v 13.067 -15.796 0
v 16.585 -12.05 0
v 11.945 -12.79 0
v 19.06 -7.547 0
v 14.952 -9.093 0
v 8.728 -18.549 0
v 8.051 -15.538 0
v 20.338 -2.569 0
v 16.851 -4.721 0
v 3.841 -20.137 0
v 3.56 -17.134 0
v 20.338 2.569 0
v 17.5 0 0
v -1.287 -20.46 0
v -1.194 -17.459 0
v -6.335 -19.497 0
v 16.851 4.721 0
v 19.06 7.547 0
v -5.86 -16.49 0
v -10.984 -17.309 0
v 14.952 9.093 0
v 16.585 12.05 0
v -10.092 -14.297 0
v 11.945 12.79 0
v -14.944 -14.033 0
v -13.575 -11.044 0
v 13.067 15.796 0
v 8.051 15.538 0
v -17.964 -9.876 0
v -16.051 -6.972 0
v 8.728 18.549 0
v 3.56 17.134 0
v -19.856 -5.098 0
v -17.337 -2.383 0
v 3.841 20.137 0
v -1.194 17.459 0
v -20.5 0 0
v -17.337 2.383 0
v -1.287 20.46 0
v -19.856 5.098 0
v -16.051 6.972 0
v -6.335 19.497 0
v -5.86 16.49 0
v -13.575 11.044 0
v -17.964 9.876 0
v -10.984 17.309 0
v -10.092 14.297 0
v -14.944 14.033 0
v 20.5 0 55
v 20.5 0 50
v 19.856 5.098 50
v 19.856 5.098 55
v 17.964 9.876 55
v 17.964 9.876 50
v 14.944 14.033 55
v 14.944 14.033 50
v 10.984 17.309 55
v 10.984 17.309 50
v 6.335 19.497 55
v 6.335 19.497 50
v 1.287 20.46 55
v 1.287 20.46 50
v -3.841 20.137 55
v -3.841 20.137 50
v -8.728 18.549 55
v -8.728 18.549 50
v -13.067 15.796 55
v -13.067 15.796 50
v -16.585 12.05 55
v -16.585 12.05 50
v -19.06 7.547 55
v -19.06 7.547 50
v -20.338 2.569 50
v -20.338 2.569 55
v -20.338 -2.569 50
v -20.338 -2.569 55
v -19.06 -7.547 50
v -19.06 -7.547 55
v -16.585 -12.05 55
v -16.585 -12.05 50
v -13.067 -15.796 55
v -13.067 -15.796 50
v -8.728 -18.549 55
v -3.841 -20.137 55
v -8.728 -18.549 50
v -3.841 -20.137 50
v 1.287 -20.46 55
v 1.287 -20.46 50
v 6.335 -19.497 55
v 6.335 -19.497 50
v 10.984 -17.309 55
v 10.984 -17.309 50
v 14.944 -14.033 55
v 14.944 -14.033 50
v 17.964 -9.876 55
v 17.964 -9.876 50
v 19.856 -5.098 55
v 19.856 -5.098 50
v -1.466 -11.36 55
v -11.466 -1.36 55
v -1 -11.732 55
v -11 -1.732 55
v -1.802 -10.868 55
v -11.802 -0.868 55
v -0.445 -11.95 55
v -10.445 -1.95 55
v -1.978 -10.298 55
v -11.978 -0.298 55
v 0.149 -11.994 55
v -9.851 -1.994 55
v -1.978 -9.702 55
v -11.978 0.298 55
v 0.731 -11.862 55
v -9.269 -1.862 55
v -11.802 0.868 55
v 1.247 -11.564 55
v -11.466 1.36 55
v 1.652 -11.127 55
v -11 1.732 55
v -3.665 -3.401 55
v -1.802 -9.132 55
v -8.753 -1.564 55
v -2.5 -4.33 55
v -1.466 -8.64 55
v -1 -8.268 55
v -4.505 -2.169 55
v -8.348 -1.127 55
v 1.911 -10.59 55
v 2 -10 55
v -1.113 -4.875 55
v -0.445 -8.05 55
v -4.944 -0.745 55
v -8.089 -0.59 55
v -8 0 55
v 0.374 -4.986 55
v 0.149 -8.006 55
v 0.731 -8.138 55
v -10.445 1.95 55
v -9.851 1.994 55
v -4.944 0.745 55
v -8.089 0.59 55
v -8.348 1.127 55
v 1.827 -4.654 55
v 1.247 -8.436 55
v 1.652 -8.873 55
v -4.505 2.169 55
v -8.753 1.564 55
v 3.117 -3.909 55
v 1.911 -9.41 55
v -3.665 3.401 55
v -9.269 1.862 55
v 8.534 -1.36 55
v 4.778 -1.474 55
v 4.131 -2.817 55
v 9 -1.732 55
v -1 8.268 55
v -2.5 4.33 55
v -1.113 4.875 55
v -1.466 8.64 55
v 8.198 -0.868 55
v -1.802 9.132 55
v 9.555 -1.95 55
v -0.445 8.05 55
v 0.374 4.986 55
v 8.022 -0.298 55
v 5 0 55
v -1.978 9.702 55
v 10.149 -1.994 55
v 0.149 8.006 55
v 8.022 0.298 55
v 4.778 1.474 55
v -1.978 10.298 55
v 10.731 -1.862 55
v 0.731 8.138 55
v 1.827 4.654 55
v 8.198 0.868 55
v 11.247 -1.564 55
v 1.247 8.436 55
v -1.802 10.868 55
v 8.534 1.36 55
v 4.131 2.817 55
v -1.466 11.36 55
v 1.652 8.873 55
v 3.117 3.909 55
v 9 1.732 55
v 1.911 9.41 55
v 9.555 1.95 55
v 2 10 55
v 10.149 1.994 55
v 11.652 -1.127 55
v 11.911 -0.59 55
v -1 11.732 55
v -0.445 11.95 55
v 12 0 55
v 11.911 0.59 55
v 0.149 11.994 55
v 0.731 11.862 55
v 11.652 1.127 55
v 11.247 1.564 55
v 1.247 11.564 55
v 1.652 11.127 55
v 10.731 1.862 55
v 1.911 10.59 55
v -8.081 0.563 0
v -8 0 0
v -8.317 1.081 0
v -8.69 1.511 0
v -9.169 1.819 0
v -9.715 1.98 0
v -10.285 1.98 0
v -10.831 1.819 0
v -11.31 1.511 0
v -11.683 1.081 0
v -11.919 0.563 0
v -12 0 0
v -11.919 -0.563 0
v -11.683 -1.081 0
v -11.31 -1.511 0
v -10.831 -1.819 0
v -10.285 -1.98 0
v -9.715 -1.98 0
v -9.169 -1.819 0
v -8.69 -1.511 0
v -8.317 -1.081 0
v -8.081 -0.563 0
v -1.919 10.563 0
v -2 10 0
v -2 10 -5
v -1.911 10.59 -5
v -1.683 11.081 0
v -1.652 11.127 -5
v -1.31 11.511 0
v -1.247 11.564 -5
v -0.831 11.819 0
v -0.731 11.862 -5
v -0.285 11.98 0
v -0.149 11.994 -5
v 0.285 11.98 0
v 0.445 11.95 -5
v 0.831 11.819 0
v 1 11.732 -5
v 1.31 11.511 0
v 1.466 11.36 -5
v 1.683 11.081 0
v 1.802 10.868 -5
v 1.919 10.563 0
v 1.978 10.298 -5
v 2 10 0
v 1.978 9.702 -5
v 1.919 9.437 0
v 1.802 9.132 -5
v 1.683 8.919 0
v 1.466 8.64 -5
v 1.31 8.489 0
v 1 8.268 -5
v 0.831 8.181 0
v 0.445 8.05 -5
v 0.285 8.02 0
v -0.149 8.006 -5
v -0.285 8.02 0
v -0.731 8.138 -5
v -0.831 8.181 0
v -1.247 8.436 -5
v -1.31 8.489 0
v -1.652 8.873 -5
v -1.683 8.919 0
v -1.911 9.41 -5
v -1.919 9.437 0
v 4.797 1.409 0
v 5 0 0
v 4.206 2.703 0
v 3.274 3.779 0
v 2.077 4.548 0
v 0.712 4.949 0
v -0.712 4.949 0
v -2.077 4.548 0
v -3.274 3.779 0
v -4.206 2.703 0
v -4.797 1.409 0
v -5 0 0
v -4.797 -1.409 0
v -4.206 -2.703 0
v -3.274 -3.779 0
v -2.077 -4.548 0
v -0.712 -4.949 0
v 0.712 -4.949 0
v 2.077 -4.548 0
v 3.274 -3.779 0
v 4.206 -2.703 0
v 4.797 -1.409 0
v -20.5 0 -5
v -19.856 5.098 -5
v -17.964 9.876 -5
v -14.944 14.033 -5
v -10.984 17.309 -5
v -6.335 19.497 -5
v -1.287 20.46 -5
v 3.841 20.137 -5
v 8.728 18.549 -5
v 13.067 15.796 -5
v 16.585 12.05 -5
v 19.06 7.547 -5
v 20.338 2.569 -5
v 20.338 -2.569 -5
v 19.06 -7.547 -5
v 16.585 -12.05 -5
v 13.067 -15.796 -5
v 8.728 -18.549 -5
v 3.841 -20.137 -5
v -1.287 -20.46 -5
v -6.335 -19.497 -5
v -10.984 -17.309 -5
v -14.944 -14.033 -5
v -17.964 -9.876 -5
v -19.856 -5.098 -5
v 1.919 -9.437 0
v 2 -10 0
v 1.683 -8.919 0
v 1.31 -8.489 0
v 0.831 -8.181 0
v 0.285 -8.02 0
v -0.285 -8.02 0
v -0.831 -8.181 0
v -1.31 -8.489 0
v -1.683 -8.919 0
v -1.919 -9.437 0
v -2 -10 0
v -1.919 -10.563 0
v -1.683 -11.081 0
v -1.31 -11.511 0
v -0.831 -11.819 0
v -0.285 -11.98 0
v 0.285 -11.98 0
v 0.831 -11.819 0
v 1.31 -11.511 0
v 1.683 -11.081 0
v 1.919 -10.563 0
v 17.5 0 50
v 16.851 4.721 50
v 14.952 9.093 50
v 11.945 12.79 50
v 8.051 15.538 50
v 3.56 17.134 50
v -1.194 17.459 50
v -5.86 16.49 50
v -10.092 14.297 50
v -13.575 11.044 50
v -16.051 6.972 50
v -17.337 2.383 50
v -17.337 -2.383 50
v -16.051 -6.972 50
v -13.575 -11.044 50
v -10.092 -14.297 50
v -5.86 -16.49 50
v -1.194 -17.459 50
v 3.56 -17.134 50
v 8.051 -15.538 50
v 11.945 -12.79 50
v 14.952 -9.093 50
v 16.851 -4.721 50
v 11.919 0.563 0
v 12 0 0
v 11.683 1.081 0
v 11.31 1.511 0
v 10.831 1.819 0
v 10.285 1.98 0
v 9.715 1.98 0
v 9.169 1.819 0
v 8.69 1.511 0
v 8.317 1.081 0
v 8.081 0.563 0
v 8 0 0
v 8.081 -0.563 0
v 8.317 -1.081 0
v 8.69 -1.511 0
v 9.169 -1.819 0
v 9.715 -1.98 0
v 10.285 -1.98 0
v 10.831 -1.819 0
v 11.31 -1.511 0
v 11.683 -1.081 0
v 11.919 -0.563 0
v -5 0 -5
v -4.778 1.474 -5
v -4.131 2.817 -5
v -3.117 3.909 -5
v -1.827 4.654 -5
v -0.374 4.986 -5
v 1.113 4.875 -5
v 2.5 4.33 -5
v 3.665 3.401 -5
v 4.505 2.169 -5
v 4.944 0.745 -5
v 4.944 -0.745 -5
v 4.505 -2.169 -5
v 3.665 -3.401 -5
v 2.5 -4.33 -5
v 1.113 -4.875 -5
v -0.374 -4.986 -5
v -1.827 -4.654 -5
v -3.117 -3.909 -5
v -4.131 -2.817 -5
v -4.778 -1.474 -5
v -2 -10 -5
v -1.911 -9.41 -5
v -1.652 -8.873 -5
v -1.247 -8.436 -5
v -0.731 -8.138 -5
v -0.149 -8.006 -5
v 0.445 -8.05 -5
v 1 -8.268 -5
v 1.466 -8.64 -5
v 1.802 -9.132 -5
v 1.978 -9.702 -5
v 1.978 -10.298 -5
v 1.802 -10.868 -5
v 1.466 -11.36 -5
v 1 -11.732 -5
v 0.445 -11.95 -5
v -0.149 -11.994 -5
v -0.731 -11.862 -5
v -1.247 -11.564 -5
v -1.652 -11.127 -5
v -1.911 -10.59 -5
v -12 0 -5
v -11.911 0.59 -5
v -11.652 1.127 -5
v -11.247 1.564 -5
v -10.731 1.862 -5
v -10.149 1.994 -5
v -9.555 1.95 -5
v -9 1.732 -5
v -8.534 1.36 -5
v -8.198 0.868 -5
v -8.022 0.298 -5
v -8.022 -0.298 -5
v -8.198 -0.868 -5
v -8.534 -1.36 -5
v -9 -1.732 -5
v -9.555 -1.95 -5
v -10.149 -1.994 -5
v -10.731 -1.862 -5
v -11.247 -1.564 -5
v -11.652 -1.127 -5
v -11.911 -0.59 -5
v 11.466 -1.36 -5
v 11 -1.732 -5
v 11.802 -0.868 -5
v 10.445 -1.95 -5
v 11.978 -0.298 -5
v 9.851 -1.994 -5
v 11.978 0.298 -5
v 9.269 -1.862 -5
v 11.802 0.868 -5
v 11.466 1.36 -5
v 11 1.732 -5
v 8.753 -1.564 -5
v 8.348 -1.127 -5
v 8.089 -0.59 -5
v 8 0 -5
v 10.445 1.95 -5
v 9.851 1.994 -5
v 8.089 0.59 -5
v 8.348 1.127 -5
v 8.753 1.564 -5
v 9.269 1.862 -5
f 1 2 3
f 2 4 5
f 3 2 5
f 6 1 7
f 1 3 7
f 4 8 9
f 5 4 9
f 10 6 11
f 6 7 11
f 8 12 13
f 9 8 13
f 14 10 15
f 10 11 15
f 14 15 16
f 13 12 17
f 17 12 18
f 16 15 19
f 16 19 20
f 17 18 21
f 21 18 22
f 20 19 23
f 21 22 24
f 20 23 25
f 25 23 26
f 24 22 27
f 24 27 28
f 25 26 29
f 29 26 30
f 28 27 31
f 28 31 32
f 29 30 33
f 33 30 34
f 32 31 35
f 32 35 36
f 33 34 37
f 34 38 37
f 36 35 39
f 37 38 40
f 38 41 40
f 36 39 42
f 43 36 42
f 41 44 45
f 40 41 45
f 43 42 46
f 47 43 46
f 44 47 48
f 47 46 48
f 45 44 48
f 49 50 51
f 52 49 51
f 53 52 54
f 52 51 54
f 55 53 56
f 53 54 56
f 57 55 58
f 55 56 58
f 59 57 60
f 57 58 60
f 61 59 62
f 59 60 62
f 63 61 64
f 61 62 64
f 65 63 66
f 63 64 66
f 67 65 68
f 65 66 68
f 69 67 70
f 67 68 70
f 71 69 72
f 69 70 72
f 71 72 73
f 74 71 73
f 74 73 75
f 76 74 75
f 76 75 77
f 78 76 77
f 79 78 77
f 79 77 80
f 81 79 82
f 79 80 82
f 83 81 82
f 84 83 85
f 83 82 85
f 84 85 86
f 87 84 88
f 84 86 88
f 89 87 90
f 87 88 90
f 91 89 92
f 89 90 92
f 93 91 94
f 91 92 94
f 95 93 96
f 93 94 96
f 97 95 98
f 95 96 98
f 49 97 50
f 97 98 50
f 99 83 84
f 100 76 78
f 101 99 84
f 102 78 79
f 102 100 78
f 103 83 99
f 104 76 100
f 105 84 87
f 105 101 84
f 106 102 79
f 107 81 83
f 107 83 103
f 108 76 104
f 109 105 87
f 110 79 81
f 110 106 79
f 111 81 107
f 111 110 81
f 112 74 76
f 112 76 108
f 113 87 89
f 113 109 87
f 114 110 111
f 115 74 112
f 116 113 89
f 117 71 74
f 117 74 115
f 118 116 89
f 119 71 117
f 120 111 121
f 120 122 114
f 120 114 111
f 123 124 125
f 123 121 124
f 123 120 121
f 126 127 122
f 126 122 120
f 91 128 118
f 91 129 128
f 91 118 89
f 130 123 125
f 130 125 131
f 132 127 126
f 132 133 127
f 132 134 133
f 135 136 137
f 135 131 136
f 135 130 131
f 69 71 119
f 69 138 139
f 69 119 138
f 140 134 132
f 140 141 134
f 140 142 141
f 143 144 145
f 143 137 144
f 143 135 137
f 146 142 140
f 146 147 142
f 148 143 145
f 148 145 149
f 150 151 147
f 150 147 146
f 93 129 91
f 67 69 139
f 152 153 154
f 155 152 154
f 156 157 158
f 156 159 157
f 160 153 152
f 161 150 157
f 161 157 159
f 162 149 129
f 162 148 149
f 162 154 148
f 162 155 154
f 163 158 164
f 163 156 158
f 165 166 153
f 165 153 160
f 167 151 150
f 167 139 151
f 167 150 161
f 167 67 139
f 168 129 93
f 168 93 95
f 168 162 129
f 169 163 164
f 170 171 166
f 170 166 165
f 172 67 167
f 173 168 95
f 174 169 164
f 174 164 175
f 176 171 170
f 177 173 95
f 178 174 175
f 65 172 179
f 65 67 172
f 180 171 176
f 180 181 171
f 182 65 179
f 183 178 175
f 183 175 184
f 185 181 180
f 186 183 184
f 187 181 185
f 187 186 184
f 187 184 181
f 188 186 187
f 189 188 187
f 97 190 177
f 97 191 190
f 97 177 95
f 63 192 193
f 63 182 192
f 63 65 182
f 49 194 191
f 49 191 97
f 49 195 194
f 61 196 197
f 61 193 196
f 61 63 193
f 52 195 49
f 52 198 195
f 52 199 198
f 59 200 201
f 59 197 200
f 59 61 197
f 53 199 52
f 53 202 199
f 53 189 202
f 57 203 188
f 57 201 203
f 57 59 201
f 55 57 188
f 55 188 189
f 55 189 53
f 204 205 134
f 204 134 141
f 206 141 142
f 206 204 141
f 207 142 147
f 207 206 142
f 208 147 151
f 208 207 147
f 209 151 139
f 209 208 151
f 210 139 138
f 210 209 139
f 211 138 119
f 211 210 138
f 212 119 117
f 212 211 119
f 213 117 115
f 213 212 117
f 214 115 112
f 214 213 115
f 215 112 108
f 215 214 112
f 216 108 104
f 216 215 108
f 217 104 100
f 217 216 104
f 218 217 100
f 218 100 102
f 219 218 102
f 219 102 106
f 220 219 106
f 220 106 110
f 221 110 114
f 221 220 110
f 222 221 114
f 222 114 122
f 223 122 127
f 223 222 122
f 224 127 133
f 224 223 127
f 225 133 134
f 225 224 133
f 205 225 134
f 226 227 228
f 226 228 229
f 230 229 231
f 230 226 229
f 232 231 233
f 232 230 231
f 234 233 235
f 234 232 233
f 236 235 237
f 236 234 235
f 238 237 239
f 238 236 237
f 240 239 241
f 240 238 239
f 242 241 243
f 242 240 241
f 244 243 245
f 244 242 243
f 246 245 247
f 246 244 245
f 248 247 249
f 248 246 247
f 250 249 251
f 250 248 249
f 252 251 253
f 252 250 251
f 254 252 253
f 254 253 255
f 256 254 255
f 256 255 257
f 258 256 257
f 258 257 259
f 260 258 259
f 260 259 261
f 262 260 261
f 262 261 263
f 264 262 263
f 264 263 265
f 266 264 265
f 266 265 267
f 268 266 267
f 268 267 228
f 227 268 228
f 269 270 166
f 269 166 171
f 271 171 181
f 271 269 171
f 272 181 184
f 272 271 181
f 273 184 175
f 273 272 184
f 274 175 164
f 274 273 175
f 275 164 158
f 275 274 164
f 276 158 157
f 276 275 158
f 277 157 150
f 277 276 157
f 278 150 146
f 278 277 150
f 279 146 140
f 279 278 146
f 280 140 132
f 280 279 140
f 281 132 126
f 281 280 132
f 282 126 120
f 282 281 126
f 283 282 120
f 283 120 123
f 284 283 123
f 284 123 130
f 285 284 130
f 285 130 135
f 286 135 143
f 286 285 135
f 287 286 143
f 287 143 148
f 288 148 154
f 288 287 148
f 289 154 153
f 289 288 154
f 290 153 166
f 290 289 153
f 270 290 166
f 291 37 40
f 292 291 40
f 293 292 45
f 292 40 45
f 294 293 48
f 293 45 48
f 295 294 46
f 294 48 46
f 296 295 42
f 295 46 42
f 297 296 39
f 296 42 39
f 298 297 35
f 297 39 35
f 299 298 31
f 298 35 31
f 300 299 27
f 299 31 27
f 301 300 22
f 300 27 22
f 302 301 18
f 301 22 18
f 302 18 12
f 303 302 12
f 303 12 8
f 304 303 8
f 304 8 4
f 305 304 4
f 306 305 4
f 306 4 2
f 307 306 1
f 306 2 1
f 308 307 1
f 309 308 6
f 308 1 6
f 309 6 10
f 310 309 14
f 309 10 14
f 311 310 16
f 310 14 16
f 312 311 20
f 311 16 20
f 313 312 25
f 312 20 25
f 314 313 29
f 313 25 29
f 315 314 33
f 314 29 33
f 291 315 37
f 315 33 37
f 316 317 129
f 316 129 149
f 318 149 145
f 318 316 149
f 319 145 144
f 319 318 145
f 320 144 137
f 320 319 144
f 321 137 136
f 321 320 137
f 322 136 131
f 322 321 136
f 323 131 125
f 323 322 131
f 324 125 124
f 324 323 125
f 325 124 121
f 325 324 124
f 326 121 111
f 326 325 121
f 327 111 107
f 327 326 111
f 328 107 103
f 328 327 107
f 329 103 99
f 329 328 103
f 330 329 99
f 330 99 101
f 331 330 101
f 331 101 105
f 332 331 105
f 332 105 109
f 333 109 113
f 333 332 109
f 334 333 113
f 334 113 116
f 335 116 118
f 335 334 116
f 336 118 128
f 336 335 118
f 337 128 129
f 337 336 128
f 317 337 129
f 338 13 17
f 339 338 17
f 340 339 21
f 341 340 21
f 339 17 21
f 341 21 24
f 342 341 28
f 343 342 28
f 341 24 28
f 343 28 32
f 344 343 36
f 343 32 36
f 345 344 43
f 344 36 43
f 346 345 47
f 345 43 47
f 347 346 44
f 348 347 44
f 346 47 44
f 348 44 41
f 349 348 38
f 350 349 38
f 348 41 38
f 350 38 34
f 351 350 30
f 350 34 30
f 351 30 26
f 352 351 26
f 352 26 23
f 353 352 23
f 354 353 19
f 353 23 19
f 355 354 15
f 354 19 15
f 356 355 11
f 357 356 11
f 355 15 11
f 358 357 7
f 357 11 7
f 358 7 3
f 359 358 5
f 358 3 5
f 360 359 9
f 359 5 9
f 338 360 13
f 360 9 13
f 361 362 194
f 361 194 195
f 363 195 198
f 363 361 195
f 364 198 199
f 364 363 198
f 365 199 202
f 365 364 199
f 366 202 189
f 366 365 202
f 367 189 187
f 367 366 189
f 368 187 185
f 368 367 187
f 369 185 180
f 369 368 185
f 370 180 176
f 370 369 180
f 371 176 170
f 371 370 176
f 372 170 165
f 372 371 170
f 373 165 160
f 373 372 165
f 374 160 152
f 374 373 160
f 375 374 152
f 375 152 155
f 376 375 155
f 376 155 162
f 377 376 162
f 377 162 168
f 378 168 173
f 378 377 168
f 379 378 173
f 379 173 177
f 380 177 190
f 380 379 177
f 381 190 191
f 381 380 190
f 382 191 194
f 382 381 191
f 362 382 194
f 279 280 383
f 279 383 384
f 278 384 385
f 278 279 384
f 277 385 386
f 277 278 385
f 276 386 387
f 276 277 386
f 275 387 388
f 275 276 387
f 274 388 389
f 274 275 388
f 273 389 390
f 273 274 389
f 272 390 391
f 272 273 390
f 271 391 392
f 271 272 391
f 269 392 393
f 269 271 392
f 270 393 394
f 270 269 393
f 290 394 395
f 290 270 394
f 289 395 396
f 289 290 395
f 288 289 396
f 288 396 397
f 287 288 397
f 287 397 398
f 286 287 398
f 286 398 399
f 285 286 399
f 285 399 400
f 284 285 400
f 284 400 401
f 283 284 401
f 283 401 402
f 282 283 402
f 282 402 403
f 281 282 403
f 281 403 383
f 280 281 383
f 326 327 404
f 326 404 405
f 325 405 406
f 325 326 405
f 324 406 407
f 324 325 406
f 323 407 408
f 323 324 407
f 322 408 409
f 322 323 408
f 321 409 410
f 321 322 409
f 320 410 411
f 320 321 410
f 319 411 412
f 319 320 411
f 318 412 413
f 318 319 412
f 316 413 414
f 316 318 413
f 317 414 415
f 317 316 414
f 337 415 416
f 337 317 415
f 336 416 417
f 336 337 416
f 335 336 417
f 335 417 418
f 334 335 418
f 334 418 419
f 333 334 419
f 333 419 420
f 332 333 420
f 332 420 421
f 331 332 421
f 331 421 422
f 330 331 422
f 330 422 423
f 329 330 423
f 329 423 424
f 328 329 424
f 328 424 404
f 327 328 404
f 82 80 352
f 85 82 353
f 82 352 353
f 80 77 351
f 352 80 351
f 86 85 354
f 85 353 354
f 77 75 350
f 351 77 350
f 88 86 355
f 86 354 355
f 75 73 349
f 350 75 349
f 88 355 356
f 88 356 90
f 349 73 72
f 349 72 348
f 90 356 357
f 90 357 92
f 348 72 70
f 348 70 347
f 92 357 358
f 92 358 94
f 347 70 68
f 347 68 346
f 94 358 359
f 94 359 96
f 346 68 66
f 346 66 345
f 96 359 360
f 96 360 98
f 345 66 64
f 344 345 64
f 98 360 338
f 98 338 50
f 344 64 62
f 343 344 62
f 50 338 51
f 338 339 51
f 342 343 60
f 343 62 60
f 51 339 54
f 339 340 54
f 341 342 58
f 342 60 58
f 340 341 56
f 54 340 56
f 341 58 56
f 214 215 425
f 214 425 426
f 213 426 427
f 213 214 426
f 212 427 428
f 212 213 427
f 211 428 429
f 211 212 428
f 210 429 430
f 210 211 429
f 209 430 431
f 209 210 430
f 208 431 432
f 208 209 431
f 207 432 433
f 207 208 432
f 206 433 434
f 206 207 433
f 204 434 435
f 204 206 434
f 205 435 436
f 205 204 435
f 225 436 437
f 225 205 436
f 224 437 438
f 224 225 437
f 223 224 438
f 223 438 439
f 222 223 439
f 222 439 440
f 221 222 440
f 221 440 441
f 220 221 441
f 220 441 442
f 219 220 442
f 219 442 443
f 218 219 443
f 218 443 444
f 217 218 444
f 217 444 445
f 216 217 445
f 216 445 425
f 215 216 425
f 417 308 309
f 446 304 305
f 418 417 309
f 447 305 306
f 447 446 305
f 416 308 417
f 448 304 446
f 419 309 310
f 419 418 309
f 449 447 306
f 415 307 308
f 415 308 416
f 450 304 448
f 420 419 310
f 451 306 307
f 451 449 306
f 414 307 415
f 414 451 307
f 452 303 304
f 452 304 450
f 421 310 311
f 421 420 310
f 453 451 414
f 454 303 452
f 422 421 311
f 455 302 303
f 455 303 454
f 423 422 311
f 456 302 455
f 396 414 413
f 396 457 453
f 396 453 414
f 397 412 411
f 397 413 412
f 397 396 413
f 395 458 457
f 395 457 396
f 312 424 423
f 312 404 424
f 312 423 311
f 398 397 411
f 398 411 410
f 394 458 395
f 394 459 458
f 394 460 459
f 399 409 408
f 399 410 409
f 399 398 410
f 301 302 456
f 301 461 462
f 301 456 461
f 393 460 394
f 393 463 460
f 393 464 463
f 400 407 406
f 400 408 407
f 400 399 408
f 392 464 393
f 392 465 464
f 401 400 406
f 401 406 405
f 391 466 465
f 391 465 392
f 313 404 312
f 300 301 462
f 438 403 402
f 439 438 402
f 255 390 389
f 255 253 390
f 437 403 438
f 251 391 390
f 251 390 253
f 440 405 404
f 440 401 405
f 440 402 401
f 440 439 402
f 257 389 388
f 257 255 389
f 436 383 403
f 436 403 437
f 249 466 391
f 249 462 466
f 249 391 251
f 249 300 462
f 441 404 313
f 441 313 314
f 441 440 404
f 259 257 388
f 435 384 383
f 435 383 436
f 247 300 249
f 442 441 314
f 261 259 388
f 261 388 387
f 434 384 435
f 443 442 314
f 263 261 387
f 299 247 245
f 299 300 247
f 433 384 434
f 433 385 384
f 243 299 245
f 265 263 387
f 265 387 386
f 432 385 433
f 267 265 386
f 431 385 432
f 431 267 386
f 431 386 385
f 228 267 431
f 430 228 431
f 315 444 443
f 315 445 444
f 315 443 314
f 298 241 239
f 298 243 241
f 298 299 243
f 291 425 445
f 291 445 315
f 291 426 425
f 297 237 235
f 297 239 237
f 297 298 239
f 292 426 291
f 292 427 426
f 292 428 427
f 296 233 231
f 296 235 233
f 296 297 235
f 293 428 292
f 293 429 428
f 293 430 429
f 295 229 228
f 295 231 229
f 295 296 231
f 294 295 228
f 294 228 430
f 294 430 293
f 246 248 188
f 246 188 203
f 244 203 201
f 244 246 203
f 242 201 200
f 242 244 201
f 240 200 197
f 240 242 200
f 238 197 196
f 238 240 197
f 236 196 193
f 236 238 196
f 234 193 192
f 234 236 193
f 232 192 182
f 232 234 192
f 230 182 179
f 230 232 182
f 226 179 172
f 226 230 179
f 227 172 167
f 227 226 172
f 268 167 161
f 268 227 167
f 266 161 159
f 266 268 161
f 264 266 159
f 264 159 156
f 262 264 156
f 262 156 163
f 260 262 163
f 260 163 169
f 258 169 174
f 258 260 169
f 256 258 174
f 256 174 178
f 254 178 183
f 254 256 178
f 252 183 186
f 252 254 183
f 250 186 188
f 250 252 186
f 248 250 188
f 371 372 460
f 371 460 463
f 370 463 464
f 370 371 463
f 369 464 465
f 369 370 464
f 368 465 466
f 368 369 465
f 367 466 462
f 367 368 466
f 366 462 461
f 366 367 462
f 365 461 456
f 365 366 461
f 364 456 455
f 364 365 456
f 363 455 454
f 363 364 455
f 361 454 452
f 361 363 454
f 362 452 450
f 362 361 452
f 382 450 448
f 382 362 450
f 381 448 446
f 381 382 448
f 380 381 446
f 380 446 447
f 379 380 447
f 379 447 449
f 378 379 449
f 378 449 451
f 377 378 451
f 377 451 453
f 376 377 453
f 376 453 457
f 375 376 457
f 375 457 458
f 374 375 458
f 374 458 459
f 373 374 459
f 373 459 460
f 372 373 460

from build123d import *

# Parameters (mm, degrees)
SKETCH1_R           = 17.5
SKETCH1_R_2         = 5
SKETCH1_R_3         = 2
BOSS_EXTRUDE1_DEPTH = 50
SKETCH2_R           = 20.5
SKETCH2_R_2         = 5
SKETCH2_R_3         = 2
BOSS_EXTRUDE2_DEPTH = 5
SKETCH3_R           = 20.5
SKETCH3_R_2         = 5
SKETCH3_R_3         = 2
BOSS_EXTRUDE3_DEPTH = 5


with BuildPart() as part:
    # Sketch1 → Boss-Extrude1 (new body)
    with BuildSketch(Plane.XY):
        Circle(SKETCH1_R)
        Circle(SKETCH1_R_2, mode=Mode.SUBTRACT)
        with Locations((0, 10)):
            Circle(SKETCH1_R_3, mode=Mode.SUBTRACT)
        with Locations((10, 0)):
            Circle(SKETCH1_R_3, mode=Mode.SUBTRACT)
        with Locations((0, -10)):
            Circle(SKETCH1_R_3, mode=Mode.SUBTRACT)
        with Locations((-10, 0)):
            Circle(SKETCH1_R_3, mode=Mode.SUBTRACT)
    extrude(amount=BOSS_EXTRUDE1_DEPTH)

    # Sketch2 → Boss-Extrude2 (add)
    with BuildSketch(Plane.XY.offset(50)):
        Circle(SKETCH2_R)
        Circle(SKETCH2_R_2, mode=Mode.SUBTRACT)
        with Locations((0, 10)):
            Circle(SKETCH2_R_3, mode=Mode.SUBTRACT)
        with Locations((10, 0)):
            Circle(SKETCH2_R_3, mode=Mode.SUBTRACT)
        with Locations((0, -10)):
            Circle(SKETCH2_R_3, mode=Mode.SUBTRACT)
        with Locations((-10, 0)):
            Circle(SKETCH2_R_3, mode=Mode.SUBTRACT)
    extrude(amount=BOSS_EXTRUDE2_DEPTH)

    # Sketch3 → Boss-Extrude3 (add)
    with BuildSketch(Plane(origin=(0, 0, 0), x_dir=(-1, 0, 0), z_dir=(0, 0, -1))):
        Circle(SKETCH3_R)
        Circle(SKETCH3_R_2, mode=Mode.SUBTRACT)
        with Locations((0, 10)):
            Circle(SKETCH3_R_3, mode=Mode.SUBTRACT)
        with Locations((10, 0)):
            Circle(SKETCH3_R_3, mode=Mode.SUBTRACT)
        with Locations((0, -10)):
            Circle(SKETCH3_R_3, mode=Mode.SUBTRACT)
        with Locations((-10, 0)):
            Circle(SKETCH3_R_3, mode=Mode.SUBTRACT)
    extrude(amount=BOSS_EXTRUDE3_DEPTH)


solid = part.part
